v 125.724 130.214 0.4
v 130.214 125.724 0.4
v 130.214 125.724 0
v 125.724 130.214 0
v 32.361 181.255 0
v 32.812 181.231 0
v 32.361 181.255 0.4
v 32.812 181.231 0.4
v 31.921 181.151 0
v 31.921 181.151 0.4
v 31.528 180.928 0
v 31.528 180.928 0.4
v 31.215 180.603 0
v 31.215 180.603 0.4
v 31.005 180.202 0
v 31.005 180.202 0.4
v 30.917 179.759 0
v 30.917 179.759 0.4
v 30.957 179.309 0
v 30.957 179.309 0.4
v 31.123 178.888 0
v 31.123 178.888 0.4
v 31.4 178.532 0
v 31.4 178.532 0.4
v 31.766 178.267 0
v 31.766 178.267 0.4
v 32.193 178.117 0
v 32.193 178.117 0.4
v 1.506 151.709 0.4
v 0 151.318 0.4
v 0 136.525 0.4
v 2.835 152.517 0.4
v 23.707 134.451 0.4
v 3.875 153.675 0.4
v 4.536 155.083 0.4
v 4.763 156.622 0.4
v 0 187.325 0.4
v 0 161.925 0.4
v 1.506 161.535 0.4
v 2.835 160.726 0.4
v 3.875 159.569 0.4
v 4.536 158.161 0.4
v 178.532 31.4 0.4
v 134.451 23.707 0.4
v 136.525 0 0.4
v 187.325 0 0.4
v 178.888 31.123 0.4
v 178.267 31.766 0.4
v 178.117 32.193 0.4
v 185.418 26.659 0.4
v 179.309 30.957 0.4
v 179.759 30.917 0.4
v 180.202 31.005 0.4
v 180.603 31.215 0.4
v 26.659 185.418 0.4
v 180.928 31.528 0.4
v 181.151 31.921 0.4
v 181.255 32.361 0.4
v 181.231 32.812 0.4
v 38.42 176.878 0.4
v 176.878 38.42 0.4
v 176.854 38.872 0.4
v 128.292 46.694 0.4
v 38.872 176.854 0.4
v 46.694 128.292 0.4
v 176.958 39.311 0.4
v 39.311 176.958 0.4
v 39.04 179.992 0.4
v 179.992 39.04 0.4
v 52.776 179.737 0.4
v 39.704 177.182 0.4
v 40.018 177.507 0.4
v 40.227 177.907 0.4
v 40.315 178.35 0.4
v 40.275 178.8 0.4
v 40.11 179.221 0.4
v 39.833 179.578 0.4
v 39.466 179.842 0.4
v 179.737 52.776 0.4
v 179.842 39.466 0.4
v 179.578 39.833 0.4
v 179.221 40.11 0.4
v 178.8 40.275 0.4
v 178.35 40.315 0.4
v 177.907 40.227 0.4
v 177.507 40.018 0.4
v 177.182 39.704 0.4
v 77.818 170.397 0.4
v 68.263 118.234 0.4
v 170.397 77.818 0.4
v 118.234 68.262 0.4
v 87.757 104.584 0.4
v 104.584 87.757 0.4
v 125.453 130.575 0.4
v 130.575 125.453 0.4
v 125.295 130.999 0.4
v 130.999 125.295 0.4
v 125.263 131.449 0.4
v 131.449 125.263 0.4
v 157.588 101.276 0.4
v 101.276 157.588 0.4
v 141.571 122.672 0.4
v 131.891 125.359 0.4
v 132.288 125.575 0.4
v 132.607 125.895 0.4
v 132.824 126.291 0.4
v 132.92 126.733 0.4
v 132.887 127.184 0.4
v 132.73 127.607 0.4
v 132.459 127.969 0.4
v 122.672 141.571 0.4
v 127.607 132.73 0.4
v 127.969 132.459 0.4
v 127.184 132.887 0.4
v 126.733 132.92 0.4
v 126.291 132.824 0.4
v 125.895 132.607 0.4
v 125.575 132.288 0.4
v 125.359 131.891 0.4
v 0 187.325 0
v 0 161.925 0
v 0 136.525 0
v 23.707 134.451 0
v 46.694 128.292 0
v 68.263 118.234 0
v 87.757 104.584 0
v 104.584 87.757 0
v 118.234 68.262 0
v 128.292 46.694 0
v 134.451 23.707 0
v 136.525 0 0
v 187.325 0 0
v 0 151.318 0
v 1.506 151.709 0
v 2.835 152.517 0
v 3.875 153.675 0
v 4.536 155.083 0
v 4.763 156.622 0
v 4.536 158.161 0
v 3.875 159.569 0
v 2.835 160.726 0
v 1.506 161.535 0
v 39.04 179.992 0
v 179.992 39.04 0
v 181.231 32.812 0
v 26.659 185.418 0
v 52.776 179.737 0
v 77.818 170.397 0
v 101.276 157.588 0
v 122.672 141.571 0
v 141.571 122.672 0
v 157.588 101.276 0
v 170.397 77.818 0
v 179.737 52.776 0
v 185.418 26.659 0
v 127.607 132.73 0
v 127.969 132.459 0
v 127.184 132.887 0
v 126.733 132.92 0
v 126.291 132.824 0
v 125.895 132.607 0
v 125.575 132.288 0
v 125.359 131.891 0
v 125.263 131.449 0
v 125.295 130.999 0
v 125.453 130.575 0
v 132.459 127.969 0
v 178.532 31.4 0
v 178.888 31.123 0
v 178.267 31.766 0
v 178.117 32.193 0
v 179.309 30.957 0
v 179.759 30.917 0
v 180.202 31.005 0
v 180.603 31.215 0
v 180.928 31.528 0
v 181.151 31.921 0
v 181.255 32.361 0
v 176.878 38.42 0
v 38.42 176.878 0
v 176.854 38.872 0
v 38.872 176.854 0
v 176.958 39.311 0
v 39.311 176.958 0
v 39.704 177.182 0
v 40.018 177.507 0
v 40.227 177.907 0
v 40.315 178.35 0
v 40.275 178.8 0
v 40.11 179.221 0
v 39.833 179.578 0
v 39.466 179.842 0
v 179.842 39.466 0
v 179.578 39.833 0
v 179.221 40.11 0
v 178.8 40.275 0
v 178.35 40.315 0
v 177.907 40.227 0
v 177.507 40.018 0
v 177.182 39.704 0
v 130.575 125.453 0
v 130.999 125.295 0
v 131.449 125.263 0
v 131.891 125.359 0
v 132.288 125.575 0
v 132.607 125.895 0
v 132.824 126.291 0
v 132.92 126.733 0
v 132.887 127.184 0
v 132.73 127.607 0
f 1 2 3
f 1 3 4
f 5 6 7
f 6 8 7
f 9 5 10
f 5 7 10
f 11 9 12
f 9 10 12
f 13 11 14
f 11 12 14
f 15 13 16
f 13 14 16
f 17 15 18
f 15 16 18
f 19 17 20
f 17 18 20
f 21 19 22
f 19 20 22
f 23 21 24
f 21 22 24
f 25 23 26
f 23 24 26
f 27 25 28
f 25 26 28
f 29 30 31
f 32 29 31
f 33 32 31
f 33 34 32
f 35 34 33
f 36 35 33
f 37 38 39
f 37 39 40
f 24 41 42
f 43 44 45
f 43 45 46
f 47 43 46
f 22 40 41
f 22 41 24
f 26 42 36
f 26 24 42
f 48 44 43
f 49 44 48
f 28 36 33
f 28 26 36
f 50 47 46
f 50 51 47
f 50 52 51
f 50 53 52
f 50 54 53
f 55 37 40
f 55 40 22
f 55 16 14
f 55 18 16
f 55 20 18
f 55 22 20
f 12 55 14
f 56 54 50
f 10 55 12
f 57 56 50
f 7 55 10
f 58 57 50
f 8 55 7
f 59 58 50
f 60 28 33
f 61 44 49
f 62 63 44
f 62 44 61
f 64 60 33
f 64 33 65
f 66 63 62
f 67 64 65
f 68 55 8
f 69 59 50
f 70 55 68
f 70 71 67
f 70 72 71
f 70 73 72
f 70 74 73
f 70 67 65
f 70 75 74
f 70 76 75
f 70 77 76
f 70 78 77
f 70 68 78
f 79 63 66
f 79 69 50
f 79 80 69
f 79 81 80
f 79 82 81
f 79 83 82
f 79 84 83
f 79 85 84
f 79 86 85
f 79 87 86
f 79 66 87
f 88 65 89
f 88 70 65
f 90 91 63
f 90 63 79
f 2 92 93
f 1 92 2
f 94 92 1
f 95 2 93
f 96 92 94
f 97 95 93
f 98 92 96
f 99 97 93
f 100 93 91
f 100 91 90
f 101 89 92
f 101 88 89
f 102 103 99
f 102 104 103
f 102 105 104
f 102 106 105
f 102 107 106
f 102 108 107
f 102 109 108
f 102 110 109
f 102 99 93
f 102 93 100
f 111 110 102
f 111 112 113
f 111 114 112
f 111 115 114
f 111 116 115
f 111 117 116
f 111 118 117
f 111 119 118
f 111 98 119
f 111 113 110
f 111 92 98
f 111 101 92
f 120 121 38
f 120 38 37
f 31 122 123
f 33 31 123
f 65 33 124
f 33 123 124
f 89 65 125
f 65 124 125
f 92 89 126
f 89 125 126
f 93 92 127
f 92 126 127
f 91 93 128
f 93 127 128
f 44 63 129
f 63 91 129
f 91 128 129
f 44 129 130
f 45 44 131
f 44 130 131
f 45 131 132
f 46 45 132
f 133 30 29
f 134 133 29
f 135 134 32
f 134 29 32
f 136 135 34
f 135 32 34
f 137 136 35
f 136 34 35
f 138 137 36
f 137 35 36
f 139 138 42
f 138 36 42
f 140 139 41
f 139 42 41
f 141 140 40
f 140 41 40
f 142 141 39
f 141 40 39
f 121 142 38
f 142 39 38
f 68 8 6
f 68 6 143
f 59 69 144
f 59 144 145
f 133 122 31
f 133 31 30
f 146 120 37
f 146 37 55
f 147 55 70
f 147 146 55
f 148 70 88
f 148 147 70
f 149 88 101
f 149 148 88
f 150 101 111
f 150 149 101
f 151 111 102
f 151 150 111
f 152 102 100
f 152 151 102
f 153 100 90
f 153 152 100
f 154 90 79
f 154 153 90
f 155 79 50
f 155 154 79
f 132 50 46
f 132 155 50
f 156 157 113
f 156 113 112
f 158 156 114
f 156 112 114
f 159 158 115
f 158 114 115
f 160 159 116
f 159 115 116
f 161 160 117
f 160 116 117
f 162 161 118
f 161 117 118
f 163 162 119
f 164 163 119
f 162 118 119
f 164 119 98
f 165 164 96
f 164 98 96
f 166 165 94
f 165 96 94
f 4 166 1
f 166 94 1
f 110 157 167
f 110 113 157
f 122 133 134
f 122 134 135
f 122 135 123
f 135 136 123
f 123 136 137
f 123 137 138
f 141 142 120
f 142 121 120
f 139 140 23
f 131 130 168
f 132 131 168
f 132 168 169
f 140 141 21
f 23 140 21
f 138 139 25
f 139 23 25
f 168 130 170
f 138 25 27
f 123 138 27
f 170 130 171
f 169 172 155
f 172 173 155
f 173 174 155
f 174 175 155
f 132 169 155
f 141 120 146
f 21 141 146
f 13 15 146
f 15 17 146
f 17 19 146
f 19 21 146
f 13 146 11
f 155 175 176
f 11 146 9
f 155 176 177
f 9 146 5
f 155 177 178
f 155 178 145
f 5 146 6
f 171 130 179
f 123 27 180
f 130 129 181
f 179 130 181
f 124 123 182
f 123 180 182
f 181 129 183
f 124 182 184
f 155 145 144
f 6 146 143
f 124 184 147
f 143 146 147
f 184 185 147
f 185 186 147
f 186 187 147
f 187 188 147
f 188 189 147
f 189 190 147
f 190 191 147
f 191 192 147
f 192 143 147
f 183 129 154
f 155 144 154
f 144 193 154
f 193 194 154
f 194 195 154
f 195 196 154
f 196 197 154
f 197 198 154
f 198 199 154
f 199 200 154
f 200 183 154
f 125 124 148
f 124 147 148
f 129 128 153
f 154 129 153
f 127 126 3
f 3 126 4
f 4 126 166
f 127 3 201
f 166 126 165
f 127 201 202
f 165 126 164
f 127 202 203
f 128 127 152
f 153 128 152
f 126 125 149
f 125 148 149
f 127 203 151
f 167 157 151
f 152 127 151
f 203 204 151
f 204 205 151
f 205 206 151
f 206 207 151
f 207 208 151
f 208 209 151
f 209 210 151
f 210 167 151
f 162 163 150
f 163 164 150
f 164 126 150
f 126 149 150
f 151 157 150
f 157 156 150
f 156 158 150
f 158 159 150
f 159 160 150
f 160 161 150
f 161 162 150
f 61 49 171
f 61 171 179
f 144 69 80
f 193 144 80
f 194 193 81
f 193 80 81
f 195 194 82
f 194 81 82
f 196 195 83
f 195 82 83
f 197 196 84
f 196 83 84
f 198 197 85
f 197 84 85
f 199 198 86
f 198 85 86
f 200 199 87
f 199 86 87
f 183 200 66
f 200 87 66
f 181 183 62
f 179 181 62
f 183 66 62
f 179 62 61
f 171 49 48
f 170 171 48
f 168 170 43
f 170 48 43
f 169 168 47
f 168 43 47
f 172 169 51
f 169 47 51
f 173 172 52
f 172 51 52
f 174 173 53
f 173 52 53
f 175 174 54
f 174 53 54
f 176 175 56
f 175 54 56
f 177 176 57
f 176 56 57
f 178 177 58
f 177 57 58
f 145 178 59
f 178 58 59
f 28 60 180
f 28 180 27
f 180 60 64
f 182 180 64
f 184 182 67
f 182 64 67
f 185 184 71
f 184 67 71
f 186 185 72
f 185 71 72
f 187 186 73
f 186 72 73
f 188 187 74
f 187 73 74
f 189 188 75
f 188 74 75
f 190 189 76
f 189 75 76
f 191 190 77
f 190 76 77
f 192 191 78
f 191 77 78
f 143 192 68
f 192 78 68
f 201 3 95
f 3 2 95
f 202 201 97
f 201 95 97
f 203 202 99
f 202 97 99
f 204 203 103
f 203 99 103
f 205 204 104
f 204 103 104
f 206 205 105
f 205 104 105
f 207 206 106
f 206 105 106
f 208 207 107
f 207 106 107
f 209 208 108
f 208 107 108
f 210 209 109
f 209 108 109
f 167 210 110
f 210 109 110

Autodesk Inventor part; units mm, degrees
ref_plane "YZ Plane" through (0, 0, 0) normal (1, 0, 0) x (0, 1, 0)
ref_plane "XZ Plane" through (0, 0, 0) normal (0, 1, 0) x (-1, 0, 0)
ref_plane "XY Plane" through (0, 0, 0) normal (0, 0, 1) x (1, 0, 0)
sketch "Sketch1" plane through (0, 0, 0) normal (0, 0, 1) x (1, 0, 0)
  arc A0 (187.325, 0) -> (0, 187.325) centre (0, 0) ccw
  arc A1 (136.525, 0) -> (0, 136.525) centre (0, 0) ccw
  line L0 (0, 136.525) -> (0, 187.325)
  line L1 (136.525, 0) -> (187.325, 0)
  point P0 (161.925, 0)
  point P1 (0, 161.925)
  dimension "d2" = 187.325
  dimension "d3" = 136.525
extrude "Extrusion1" add sketch "Sketch1" along normal blind 0.4
sketch "Sketch3" plane through (0, 0, 0.4) normal (0, 0, 1) x (1, 0, 0)
  line L0 (178.117, 32.1925) -> (176.8782, 38.4205) projected
  arc A0 (178.117, 32.1925) -> (181.231, 32.8119) centre (179.674, 32.5022) ccw projected
  line L1 (179.9922, 39.0399) -> (181.231, 32.8119) projected
  arc A1 (179.9922, 39.0399) -> (176.8782, 38.4205) centre (178.4352, 38.7302) ccw projected
  line L2 (130.2137, 125.7236) -> (125.7236, 130.2137) projected
  arc A2 (130.2137, 125.7236) -> (132.4588, 127.9686) centre (131.3362, 126.8461) ccw projected
  arc A3 (127.9686, 132.4588) -> (125.7236, 130.2137) centre (126.8461, 131.3362) ccw projected
  line L3 (127.9686, 132.4588) -> (132.4588, 127.9686) projected
  line L4 (38.4205, 176.8782) -> (32.1925, 178.117) projected
  arc A4 (38.4205, 176.8782) -> (39.0399, 179.9922) centre (38.7302, 178.4352) ccw projected
  line L5 (32.8119, 181.231) -> (39.0399, 179.9922) projected
  arc A5 (32.8119, 181.231) -> (32.1925, 178.117) centre (32.5022, 179.674) ccw projected
  arc A6 (0, 161.925) -> (0, 151.3184) centre (-0.5713, 156.6217) ccw projected
  circle A7 centre (-0.5713, 156.6217) radius 5.334
  point P0 (0, 0)
  point P1 (0, 161.925)
extrude "Extrusion2" cut sketch "Sketch3" against normal through all
properties part number "3DPRINT,CABLE,TRAY" material "ABS Plastic"
